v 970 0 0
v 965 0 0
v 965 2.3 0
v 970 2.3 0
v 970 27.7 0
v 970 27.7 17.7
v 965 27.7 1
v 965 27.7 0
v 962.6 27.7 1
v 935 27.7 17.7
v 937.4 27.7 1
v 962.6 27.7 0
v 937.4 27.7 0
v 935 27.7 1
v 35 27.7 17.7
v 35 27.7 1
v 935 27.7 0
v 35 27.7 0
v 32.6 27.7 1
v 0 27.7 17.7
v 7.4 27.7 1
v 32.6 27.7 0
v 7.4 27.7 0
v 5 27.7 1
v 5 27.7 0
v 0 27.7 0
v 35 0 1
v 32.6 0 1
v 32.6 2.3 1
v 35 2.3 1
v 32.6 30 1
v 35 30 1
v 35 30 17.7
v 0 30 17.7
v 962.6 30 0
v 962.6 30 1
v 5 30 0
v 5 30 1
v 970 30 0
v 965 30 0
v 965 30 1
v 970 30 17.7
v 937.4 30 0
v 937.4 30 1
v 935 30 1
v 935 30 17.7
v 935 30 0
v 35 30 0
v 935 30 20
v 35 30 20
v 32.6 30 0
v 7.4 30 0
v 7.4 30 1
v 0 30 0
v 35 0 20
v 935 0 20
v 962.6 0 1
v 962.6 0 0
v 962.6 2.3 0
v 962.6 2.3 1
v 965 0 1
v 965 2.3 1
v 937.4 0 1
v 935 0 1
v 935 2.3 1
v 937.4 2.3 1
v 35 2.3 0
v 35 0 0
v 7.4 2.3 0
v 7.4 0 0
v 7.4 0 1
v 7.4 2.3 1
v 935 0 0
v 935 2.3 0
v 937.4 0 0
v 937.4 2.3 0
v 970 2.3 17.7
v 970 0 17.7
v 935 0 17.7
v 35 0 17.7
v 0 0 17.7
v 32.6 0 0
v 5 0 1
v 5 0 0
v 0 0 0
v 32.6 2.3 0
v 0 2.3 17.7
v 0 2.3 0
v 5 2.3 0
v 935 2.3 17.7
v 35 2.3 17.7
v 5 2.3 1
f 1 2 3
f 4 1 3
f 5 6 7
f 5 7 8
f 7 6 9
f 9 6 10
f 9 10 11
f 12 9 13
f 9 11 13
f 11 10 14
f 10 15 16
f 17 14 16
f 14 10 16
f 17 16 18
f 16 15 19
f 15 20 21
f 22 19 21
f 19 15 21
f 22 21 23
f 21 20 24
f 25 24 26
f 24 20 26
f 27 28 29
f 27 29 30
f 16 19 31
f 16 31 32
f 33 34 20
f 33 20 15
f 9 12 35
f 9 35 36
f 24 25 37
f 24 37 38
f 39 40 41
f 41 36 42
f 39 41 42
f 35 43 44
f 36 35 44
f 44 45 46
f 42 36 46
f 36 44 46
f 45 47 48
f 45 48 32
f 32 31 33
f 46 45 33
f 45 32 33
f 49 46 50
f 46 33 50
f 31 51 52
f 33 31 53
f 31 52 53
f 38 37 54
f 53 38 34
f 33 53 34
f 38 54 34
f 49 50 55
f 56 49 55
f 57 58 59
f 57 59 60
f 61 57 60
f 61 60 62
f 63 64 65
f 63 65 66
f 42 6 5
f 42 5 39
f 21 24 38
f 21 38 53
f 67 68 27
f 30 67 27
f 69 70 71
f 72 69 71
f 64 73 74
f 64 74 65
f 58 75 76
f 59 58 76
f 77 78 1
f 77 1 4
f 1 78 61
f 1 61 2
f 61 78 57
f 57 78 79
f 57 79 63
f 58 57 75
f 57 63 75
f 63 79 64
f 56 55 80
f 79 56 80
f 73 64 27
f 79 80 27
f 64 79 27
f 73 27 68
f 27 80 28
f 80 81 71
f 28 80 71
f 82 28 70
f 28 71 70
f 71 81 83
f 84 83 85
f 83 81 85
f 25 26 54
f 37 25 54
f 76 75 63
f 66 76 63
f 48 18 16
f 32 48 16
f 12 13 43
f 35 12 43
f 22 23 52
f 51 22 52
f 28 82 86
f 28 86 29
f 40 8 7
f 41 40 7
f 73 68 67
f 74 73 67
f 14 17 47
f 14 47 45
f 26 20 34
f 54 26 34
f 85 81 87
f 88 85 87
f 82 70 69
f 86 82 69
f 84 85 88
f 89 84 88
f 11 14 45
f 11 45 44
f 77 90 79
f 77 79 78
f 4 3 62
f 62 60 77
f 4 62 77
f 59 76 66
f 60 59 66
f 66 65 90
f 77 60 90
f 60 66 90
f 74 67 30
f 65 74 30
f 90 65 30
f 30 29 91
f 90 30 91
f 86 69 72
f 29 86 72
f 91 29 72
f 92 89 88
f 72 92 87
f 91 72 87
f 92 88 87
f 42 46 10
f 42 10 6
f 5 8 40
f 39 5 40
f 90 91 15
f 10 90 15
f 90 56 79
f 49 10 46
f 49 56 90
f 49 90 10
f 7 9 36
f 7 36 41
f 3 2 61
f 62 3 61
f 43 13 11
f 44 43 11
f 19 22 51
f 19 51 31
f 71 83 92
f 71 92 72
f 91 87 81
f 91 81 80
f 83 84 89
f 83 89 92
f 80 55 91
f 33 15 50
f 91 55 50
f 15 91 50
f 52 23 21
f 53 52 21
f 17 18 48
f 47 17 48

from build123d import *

# Parameters (mm, degrees)
F1_DEPTH = 970
F2_W     = 35
F2_H     = 30
F3_DEPTH = 2.3
F4_W     = 2.4
F4_H     = 1
F5_DEPTH = 30.001


with BuildPart() as f1:
    # F0 (on Right) → F1 (new body)
    with BuildSketch(Plane.YZ):
        Polygon((0, 20), (0, 0), (2.3, 0), (2.3, 17.7), (27.7, 17.7), (27.7, 0), (30, 0), (30, 20), align=None)
    extrude(amount=F1_DEPTH)

    # F2 (on face) → F3 (cut)
    with BuildSketch(Plane.XY.offset(20)):
        with Locations((17.5, 15)):
            Rectangle(F2_W, F2_H)
        with Locations((952.5, 15)):
            Rectangle(F2_W, F2_H)
    extrude(amount=-F3_DEPTH, mode=Mode.SUBTRACT)

    # F4 (on face) → F5 (cut, through all)
    with BuildSketch(Plane.XZ):
        with Locations((33.8, 0.5)):
            Rectangle(F4_W, F4_H)
        with Locations((6.2, 0.5)):
            Rectangle(F4_W, F4_H)
        with Locations((936.2, 0.5)):
            Rectangle(F4_W, F4_H)
        with Locations((963.8, 0.5)):
            Rectangle(F4_W, F4_H)
    extrude(amount=-F5_DEPTH, mode=Mode.SUBTRACT)


solid = f1.part
